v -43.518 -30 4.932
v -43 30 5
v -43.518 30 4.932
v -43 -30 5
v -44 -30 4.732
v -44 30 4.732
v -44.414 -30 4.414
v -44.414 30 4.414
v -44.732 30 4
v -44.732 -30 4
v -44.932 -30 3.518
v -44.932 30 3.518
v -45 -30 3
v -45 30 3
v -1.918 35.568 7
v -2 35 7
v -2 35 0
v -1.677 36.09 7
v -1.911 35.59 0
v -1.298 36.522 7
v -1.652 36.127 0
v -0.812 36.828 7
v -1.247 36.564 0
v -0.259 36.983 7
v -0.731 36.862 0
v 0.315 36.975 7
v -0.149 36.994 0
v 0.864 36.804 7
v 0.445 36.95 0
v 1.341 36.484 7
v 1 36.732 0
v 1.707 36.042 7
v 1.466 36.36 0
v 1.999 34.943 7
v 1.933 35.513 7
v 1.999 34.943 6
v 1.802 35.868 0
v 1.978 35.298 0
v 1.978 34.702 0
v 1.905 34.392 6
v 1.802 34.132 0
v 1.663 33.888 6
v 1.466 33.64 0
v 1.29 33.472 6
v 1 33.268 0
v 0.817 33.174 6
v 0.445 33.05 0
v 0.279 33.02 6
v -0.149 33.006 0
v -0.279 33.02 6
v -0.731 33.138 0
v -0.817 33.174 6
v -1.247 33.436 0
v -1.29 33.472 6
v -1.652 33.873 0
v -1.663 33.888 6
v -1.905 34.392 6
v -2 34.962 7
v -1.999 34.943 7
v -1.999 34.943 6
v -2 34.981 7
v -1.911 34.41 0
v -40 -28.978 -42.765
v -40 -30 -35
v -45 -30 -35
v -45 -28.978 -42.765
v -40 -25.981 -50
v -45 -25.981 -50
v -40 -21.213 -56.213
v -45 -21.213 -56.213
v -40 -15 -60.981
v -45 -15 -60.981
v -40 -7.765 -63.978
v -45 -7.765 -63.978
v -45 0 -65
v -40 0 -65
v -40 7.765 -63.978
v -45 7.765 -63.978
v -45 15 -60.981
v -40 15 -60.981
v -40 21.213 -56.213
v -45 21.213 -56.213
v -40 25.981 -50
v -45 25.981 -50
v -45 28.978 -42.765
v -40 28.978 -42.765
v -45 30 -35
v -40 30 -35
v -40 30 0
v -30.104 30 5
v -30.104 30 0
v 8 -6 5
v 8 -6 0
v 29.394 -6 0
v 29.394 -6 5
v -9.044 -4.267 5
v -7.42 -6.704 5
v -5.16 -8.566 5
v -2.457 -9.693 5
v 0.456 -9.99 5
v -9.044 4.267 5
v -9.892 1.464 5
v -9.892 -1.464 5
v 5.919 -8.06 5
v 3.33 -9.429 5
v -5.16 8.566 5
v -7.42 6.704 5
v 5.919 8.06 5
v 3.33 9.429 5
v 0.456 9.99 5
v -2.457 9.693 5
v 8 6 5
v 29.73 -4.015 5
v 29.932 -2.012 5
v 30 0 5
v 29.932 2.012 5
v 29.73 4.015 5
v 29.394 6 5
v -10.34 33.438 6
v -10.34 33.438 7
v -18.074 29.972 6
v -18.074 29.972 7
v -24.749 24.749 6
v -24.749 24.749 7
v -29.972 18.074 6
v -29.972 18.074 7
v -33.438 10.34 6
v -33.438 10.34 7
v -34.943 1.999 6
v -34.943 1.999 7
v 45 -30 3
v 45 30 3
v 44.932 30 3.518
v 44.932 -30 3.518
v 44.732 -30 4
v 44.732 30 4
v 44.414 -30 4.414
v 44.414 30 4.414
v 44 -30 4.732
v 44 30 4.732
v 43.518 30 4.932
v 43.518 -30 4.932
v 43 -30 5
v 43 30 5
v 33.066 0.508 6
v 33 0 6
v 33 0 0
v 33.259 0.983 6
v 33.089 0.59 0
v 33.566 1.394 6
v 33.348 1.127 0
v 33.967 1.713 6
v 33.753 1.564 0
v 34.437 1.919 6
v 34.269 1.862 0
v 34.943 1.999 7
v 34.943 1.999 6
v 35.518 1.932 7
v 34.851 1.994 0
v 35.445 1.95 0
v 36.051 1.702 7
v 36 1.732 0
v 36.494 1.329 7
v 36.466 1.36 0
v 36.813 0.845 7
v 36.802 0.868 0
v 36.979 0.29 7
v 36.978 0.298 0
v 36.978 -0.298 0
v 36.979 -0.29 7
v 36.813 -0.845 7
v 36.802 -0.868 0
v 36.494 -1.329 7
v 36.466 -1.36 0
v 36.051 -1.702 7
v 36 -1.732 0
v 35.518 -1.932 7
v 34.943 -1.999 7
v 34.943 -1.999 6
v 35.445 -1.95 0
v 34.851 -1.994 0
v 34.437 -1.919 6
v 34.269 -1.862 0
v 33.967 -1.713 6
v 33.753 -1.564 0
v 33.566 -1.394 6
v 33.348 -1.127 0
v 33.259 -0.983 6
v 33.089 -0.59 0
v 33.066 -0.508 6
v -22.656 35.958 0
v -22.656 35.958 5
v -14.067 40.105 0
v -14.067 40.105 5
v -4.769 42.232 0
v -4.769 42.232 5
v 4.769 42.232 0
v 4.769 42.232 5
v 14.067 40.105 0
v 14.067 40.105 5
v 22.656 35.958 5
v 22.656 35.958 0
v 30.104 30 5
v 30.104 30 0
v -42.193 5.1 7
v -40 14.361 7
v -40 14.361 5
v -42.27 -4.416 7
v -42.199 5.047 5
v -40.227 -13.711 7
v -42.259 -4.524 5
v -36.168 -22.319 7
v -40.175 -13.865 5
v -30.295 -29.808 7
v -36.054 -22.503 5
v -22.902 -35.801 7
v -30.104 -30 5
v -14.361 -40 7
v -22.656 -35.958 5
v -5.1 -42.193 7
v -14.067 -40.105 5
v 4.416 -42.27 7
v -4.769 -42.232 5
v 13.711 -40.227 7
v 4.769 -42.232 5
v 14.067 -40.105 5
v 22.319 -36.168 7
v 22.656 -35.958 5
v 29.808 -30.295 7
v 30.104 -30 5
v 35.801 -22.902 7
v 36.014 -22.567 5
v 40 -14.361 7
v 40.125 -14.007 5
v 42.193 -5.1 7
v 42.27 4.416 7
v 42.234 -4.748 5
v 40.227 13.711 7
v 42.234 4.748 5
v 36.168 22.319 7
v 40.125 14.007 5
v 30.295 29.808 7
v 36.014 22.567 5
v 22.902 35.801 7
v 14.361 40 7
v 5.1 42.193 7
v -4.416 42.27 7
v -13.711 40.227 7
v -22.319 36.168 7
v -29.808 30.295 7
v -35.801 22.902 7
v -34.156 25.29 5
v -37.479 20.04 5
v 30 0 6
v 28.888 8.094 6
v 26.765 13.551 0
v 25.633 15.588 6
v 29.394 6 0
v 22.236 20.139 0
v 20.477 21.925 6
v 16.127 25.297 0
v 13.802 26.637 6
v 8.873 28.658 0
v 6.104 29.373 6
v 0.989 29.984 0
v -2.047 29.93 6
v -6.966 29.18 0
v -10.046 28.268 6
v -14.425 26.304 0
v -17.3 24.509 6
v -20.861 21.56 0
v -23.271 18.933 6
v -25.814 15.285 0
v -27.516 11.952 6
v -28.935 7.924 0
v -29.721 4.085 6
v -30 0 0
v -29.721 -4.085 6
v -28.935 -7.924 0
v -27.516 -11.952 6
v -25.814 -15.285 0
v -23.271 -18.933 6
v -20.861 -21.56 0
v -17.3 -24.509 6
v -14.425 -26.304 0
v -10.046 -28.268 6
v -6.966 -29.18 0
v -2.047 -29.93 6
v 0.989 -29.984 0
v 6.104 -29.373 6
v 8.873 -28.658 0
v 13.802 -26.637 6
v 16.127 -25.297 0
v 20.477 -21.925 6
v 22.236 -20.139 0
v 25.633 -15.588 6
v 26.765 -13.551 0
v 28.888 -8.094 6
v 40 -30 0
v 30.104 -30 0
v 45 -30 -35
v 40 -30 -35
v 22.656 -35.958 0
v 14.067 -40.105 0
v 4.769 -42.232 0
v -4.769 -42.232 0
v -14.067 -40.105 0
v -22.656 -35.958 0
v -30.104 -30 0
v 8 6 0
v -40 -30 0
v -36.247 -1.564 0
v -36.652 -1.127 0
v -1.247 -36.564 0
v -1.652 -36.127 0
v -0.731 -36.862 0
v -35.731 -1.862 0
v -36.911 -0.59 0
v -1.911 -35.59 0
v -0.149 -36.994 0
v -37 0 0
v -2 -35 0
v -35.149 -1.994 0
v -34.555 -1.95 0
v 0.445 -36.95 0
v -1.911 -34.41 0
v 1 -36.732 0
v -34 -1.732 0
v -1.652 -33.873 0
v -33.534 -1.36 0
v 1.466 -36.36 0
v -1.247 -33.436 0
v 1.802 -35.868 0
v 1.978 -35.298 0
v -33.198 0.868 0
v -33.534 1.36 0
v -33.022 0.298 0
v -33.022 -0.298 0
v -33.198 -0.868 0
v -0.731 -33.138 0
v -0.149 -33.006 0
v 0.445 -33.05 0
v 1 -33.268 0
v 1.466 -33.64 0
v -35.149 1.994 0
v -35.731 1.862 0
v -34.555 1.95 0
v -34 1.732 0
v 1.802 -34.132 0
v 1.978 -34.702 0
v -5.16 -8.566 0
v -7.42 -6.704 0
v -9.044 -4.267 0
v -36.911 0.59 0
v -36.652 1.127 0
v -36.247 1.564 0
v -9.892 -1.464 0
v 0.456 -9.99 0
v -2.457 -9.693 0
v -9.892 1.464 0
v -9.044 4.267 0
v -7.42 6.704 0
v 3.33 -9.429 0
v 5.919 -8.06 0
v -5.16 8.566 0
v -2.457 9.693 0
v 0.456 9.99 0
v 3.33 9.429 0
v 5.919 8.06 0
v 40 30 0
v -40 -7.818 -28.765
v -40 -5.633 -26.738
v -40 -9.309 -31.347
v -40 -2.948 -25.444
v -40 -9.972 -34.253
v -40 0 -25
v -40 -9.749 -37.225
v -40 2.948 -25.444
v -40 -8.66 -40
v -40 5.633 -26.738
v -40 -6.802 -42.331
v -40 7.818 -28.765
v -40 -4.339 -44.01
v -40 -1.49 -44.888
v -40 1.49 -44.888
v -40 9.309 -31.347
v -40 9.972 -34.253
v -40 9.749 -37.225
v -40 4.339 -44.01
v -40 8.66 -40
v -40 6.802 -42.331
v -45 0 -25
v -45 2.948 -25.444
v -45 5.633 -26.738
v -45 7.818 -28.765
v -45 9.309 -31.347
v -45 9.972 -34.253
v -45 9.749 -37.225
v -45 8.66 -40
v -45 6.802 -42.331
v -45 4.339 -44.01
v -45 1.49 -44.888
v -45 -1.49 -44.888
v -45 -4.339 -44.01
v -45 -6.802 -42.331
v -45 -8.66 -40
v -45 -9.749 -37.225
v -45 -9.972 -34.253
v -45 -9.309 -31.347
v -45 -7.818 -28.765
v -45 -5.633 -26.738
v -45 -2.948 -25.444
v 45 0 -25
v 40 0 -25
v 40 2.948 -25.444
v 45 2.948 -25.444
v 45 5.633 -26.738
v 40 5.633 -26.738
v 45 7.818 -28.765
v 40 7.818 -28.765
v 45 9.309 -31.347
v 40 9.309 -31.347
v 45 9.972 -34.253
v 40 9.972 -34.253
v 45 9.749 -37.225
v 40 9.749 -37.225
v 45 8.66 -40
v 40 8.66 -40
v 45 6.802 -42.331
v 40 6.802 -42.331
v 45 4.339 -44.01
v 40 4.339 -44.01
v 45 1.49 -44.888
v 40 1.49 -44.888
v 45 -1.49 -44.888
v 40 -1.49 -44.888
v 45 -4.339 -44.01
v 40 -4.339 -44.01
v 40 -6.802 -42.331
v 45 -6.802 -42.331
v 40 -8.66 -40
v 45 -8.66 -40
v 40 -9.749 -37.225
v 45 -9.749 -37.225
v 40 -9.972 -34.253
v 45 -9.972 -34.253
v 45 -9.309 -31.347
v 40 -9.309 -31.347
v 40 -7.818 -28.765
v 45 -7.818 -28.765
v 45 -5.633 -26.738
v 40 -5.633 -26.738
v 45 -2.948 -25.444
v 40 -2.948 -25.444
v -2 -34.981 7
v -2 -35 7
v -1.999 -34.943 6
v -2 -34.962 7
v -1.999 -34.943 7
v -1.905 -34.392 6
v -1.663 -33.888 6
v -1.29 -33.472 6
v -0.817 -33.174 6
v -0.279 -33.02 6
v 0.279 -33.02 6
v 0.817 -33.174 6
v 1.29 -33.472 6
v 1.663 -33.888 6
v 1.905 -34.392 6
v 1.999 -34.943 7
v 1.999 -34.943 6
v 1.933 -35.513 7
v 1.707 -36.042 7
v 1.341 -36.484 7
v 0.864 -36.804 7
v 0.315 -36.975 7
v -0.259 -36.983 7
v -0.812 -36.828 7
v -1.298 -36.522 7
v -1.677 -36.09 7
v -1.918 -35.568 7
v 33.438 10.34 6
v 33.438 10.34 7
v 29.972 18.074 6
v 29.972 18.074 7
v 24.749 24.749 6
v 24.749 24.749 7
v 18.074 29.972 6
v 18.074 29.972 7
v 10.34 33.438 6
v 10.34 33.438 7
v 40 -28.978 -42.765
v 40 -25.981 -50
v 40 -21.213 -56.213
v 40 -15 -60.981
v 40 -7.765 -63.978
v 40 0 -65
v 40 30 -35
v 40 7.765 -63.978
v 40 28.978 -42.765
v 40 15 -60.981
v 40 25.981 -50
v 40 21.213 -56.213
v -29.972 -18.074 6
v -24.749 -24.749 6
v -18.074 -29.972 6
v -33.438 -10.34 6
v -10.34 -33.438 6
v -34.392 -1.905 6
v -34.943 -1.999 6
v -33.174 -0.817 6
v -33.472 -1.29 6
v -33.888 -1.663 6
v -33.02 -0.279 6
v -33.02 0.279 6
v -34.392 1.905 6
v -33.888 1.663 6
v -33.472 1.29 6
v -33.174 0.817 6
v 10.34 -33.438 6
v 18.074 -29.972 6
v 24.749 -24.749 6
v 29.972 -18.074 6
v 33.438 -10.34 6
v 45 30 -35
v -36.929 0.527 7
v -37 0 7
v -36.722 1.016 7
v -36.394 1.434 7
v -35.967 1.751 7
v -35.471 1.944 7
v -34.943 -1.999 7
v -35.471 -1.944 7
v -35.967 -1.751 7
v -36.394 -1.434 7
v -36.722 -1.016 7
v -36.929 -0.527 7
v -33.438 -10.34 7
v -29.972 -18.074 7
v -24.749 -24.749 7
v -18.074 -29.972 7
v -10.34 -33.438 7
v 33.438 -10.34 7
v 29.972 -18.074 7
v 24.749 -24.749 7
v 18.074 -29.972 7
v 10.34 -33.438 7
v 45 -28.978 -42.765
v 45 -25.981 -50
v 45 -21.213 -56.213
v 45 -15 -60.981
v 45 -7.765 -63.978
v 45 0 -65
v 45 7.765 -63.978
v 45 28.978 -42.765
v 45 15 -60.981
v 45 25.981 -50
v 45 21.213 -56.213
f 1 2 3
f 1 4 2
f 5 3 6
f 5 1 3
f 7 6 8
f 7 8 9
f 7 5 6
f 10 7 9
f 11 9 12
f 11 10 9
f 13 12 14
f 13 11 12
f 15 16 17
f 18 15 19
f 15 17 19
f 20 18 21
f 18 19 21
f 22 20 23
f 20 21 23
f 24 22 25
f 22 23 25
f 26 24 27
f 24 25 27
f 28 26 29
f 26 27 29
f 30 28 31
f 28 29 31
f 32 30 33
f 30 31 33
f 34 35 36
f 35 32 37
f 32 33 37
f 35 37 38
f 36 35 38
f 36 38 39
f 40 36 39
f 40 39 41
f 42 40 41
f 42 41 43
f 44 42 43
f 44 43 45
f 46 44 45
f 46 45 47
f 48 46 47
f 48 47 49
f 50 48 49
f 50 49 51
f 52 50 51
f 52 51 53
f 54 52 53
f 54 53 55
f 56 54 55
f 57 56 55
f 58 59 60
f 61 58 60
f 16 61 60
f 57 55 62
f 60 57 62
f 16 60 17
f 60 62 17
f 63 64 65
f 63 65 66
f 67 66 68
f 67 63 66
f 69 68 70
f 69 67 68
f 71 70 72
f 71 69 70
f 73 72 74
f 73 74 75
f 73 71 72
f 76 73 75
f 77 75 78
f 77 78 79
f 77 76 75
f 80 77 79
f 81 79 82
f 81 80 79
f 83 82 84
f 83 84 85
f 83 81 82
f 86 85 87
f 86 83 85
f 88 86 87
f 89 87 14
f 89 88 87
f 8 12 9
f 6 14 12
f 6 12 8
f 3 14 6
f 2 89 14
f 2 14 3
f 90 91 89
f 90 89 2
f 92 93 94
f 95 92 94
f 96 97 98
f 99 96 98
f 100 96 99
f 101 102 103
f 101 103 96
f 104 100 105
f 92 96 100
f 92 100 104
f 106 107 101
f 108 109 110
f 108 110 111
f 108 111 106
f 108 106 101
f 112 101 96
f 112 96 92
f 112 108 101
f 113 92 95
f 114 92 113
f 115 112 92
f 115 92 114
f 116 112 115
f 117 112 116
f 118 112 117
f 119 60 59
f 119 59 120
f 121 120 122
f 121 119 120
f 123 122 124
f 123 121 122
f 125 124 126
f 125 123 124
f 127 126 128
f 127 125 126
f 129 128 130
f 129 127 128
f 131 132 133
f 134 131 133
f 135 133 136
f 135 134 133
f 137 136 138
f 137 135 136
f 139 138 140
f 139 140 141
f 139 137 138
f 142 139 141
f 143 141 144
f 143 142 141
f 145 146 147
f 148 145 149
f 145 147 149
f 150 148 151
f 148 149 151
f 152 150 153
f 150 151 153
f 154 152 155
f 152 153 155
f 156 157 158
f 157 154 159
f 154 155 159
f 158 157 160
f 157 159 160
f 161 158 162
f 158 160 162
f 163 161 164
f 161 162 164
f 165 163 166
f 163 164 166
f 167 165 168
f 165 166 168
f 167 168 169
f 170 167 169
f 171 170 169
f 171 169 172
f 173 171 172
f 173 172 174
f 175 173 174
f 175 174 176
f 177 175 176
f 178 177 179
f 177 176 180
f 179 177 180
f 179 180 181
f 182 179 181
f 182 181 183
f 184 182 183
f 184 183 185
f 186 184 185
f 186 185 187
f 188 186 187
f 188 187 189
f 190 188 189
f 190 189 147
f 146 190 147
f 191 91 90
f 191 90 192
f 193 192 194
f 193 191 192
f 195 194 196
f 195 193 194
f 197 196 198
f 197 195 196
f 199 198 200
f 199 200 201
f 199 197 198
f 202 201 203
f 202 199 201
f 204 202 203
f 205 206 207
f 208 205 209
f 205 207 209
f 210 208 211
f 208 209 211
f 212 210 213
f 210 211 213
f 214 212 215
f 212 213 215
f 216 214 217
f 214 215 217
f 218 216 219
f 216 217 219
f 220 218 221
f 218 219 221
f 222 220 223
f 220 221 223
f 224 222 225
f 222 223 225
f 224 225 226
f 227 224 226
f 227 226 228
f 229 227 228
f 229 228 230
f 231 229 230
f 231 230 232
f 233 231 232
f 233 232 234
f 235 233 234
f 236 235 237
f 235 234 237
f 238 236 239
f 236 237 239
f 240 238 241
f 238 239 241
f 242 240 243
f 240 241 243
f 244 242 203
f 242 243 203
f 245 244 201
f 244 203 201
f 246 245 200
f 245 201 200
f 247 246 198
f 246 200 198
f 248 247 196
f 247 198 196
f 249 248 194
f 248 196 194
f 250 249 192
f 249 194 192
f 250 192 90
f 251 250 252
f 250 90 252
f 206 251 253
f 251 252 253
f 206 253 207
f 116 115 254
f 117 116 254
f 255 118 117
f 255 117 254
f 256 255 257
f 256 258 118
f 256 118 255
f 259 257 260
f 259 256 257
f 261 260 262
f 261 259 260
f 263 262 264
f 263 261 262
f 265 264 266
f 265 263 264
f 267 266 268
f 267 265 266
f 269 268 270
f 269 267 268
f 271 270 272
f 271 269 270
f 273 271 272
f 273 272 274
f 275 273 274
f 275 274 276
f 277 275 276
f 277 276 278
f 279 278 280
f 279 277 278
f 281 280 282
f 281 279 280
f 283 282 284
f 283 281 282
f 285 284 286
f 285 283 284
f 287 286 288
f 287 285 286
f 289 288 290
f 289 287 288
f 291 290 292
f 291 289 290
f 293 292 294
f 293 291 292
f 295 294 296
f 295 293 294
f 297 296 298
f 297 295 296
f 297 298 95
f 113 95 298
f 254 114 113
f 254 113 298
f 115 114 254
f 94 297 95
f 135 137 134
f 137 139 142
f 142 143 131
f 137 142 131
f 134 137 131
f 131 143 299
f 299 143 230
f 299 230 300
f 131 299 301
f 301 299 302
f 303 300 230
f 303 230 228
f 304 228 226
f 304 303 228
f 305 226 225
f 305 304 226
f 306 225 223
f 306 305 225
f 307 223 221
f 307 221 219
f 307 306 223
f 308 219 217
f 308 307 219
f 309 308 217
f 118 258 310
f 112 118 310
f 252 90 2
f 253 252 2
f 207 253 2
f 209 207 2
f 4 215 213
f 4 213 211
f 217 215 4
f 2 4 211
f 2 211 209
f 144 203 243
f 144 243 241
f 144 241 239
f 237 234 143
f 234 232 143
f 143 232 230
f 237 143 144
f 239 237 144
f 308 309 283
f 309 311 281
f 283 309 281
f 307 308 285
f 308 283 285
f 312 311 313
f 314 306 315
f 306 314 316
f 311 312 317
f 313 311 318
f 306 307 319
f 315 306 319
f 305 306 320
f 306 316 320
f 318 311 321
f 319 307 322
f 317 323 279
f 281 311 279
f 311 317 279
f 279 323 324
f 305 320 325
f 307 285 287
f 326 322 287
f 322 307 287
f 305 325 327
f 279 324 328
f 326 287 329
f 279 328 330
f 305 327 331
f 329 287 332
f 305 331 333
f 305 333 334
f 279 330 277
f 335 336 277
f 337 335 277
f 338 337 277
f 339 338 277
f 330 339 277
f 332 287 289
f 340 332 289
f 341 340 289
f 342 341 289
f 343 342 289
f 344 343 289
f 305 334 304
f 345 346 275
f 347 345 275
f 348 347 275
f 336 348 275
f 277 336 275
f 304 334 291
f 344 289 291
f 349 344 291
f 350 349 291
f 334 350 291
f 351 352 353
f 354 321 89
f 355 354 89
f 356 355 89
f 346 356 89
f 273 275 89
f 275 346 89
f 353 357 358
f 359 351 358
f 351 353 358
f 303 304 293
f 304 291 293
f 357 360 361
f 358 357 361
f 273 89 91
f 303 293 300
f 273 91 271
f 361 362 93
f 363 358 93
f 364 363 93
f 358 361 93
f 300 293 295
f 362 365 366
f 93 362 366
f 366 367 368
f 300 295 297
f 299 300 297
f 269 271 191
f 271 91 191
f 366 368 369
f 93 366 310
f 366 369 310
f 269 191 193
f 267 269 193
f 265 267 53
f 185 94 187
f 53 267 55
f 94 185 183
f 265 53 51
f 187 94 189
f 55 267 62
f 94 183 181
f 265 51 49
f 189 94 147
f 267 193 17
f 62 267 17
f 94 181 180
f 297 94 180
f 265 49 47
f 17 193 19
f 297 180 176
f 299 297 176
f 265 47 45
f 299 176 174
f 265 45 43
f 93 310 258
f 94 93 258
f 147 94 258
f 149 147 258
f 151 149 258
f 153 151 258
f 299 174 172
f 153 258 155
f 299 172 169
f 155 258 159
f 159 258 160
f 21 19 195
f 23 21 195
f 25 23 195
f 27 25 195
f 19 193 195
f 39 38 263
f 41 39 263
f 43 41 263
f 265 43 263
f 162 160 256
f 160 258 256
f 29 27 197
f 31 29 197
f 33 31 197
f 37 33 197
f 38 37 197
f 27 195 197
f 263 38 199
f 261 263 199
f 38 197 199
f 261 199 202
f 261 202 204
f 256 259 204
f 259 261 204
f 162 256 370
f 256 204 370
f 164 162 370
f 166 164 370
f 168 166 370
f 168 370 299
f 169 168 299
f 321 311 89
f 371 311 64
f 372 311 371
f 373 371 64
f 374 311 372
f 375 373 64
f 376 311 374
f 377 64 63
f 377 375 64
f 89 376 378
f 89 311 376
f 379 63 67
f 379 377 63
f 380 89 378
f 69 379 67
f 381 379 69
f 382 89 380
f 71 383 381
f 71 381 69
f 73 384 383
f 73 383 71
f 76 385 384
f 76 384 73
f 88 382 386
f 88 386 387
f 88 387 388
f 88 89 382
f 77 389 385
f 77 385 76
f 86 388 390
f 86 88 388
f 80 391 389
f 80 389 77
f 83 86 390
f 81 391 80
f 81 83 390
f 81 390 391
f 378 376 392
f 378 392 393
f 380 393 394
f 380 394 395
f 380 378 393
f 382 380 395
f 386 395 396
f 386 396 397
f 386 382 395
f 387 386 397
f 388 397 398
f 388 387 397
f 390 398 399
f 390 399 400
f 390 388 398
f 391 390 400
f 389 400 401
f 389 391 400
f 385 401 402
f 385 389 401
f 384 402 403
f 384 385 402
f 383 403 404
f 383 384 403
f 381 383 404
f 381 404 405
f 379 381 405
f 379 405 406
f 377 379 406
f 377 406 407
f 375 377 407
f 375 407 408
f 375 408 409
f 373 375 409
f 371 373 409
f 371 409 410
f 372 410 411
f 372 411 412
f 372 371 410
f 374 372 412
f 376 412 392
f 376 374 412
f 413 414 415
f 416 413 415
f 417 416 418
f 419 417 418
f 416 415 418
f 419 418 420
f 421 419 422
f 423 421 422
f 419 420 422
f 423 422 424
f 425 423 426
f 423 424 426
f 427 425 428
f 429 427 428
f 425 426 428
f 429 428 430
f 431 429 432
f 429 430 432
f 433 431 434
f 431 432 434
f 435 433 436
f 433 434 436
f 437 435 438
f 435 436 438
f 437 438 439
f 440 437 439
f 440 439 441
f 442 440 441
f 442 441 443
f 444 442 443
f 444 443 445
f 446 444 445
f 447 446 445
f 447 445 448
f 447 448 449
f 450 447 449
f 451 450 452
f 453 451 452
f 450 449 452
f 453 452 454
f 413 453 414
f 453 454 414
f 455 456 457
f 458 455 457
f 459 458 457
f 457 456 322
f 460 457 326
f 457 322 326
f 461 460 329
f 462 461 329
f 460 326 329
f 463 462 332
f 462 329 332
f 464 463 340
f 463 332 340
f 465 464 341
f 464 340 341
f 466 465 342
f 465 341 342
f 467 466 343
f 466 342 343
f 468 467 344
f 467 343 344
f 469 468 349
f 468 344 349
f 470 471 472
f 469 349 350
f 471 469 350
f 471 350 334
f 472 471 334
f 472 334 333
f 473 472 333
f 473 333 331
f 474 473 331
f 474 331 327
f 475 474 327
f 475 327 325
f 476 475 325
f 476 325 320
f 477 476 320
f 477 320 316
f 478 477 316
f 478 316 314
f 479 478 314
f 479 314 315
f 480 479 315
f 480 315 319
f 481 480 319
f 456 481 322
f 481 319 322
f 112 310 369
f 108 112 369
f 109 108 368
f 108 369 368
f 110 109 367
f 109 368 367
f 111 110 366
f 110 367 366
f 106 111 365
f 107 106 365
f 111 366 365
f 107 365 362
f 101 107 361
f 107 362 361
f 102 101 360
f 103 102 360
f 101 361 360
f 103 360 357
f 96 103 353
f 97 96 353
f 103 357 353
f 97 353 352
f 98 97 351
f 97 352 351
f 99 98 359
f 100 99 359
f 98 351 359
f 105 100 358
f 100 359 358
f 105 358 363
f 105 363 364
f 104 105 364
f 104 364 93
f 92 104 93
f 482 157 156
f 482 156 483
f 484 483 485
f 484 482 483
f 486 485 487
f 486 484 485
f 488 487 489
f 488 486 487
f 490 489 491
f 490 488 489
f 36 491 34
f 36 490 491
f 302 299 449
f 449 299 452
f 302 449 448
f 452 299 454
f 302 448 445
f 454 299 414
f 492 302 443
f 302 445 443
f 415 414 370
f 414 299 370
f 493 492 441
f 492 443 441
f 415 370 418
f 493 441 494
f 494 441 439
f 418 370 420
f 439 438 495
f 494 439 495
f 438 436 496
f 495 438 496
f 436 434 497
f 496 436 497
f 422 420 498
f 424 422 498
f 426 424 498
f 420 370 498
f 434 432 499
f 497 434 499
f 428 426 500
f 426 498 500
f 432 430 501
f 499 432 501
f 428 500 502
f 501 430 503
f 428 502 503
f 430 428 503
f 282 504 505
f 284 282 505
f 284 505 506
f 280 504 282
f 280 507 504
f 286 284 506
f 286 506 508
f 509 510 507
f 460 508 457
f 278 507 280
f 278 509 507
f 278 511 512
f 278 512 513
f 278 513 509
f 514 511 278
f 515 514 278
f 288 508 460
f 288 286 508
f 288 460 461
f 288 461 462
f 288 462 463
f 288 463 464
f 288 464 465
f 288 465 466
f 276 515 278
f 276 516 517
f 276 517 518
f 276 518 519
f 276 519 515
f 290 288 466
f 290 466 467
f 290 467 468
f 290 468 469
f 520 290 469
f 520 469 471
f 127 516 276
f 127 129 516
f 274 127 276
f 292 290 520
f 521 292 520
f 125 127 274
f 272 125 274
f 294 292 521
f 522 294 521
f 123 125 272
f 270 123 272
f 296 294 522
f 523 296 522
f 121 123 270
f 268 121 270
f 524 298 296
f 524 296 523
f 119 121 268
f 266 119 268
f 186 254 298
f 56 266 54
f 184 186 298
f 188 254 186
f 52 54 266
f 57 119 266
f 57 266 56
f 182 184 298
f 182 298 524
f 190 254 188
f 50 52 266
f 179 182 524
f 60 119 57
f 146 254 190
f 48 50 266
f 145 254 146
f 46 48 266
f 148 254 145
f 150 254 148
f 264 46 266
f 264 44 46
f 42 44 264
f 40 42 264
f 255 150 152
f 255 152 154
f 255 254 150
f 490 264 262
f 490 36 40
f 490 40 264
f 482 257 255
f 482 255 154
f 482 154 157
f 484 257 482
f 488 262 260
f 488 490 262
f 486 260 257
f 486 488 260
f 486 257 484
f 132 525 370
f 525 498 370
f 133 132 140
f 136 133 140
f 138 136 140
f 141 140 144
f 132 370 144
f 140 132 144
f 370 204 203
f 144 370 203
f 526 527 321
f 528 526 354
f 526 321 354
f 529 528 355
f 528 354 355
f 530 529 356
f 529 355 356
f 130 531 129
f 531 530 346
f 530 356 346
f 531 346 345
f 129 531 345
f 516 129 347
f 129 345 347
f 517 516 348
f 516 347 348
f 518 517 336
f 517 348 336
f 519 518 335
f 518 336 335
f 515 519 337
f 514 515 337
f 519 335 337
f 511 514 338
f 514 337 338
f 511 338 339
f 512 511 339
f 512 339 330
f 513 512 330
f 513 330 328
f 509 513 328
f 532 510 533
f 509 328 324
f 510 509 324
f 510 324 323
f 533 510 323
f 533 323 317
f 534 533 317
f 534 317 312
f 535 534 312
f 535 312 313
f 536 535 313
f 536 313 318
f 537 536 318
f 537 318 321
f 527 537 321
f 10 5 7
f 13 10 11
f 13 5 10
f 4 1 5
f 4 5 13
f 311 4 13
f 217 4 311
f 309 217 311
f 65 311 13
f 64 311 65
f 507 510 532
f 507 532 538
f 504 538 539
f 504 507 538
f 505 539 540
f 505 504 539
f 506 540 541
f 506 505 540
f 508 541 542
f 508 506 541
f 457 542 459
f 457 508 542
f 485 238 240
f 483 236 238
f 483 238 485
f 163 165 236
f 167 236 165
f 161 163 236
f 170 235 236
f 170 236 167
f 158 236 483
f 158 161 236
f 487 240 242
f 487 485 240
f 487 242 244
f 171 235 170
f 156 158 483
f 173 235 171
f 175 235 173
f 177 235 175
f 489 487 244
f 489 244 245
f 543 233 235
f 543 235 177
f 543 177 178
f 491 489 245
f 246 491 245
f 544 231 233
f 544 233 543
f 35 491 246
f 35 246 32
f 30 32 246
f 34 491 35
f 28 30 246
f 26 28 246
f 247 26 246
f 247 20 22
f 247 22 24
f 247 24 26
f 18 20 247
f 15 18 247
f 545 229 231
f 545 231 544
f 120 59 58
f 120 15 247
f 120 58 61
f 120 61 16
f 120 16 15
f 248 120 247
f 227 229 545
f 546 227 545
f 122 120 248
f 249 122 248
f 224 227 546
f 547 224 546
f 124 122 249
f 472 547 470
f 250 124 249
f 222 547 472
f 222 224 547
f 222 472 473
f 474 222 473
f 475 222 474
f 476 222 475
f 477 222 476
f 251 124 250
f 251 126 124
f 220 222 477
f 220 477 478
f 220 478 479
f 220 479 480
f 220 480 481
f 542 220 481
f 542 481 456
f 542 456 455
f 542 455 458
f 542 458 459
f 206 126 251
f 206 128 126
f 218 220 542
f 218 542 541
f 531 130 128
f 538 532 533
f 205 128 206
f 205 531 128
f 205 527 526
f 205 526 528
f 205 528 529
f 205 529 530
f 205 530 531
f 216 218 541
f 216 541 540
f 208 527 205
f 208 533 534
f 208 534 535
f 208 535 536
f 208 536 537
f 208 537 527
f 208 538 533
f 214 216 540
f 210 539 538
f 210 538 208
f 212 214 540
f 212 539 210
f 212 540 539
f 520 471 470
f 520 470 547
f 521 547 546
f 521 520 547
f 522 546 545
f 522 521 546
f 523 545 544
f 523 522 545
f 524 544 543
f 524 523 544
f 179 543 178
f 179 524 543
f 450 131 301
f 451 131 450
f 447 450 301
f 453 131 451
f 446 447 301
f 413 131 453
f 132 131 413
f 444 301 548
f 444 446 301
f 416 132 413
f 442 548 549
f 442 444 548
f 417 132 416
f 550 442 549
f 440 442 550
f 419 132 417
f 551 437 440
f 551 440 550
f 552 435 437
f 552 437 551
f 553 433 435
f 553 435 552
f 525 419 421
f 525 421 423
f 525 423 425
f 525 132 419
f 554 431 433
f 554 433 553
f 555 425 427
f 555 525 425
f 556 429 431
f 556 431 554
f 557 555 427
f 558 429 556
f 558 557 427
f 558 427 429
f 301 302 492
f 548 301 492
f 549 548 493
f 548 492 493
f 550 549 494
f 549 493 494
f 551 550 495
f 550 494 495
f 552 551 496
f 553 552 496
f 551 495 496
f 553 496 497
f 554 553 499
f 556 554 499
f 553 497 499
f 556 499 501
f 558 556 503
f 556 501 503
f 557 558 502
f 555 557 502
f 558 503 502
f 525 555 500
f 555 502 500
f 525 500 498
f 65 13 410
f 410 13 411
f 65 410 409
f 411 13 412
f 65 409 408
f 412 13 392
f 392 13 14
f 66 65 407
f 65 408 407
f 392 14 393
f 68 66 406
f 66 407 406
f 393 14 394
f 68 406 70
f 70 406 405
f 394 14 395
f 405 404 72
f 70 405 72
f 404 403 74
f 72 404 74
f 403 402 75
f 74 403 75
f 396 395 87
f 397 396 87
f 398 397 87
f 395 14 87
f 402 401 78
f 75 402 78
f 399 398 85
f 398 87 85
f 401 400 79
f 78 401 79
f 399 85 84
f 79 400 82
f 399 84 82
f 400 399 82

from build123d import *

# Parameters (mm, degrees)
SKETCH_1_R             = 30
EXTRUDE_1_DEPTH        = 5
SKETCH_2_R             = 35
SKETCH_2_R_2           = 30
EXTRUDE_2_DEPTH        = 1
SKETCH_4_R             = 42.5
SKETCH_4_R_2           = 35
EXTRUDE_3_DEPTH        = 2
SKETCH_5_R             = 2
CUT_EXTRUDE_3_DEPTH    = 61.51033
SKETCH_6_R             = 10
EXTRUDE_4_DEPTH        = 5
FILLET_1_R             = 2
FILLET_1_OF_MIRROR_1_R = 2
EXTRUDE_5_DEPTH        = 5


with BuildPart() as part:
    # 草图1 → 凸台-拉伸1 (new body)
    with BuildSketch(Plane.XY):
        with BuildLine():
            Line((-30.103986, -30), (-40, -30))
            Line((-40, -30), (-40, 30))
            Line((-40, 30), (-30.103986, 30))
            ThreePointArc((-30.103986, 30), (0, 42.5), (30.103986, 30))
            Line((30.103986, 30), (40, 30))
            Line((40, 30), (40, -30))
            Line((40, -30), (30.103986, -30))
            ThreePointArc((30.103986, -30), (0, -42.5), (-30.103986, -30))
        make_face()
        Circle(SKETCH_1_R, mode=Mode.SUBTRACT)
    extrude(amount=EXTRUDE_1_DEPTH)

    # 草图2 → 凸台-拉伸2 (add)
    with BuildSketch(Plane.XY.offset(5)):
        Circle(SKETCH_2_R)
        Circle(SKETCH_2_R_2, mode=Mode.SUBTRACT)
    extrude(amount=EXTRUDE_2_DEPTH)

    # 草图4 → 凸台-拉伸3 (add)
    with BuildSketch(Plane.XY.offset(5)):
        with Locations(Location((0, 0, 0), (0, 0, 160.250077))):
            Circle(SKETCH_4_R)
        Circle(SKETCH_4_R_2, mode=Mode.SUBTRACT)
    extrude(amount=EXTRUDE_3_DEPTH)

    # 草图5 → 切除-拉伸3 (cut, through all)
    with BuildSketch(Plane(origin=(0, 0, 0), x_dir=(-1, 0, 0), z_dir=(0, 0, -1))):
        with Locations((0, 35)):
            Circle(SKETCH_5_R)
        with Locations((35, 0)):
            Circle(SKETCH_5_R)
        with Locations((0, -35)):
            Circle(SKETCH_5_R)
        with Locations((-35, 0)):
            Circle(SKETCH_5_R)
    extrude(amount=-CUT_EXTRUDE_3_DEPTH, mode=Mode.SUBTRACT)

    # 草图6 → 凸台-拉伸4 (add)
    with BuildSketch(Plane.ZY.offset(40)):
        with BuildLine():
            Line((5, -30), (-35, -30))
            ThreePointArc((-35, -30), (-65, 0), (-35, 30))
            Line((-35, 30), (5, 30))
            Line((5, 30), (5, -30))
        make_face()
        with Locations((-35, 0)):
            Circle(SKETCH_6_R, mode=Mode.SUBTRACT)
    extrude_4 = extrude(amount=EXTRUDE_4_DEPTH)

    # 圆角1
    fillet_1_edges = [part.edges().sort_by_distance(p)[0] for p in [
        (-45, 0, 5),
    ]]
    fillet(fillet_1_edges, radius=FILLET_1_R)

    # 镜向1: 凸台-拉伸4 across plane
    add(extrude_4.mirror(Plane(origin=(0, 0, 0), x_dir=(0, 0, 1), z_dir=(1, 0, 0))))

    # 圆角1 of 镜向1
    fillet_1_of_mirror_1_edges = [part.edges().sort_by_distance(p)[0] for p in [
        (45, 0, 5),
    ]]
    fillet(fillet_1_of_mirror_1_edges, radius=FILLET_1_OF_MIRROR_1_R)

    # 草图7 → 凸台-拉伸5 (add)
    with BuildSketch(Plane(origin=(0, 0, 0), x_dir=(-1, 0, 0), z_dir=(0, 0, -1))):
        with BuildLine():
            Line((-8, -6), (-29.686217, -6))
            ThreePointArc((-29.686217, -6), (-30.28649, 0), (-29.686217, 6))
            Line((-29.686217, 6), (-8, 6))
            ThreePointArc((-8, 6), (10, 0), (-8, -6))
        make_face()
    extrude(amount=-EXTRUDE_5_DEPTH)


solid = part.part
